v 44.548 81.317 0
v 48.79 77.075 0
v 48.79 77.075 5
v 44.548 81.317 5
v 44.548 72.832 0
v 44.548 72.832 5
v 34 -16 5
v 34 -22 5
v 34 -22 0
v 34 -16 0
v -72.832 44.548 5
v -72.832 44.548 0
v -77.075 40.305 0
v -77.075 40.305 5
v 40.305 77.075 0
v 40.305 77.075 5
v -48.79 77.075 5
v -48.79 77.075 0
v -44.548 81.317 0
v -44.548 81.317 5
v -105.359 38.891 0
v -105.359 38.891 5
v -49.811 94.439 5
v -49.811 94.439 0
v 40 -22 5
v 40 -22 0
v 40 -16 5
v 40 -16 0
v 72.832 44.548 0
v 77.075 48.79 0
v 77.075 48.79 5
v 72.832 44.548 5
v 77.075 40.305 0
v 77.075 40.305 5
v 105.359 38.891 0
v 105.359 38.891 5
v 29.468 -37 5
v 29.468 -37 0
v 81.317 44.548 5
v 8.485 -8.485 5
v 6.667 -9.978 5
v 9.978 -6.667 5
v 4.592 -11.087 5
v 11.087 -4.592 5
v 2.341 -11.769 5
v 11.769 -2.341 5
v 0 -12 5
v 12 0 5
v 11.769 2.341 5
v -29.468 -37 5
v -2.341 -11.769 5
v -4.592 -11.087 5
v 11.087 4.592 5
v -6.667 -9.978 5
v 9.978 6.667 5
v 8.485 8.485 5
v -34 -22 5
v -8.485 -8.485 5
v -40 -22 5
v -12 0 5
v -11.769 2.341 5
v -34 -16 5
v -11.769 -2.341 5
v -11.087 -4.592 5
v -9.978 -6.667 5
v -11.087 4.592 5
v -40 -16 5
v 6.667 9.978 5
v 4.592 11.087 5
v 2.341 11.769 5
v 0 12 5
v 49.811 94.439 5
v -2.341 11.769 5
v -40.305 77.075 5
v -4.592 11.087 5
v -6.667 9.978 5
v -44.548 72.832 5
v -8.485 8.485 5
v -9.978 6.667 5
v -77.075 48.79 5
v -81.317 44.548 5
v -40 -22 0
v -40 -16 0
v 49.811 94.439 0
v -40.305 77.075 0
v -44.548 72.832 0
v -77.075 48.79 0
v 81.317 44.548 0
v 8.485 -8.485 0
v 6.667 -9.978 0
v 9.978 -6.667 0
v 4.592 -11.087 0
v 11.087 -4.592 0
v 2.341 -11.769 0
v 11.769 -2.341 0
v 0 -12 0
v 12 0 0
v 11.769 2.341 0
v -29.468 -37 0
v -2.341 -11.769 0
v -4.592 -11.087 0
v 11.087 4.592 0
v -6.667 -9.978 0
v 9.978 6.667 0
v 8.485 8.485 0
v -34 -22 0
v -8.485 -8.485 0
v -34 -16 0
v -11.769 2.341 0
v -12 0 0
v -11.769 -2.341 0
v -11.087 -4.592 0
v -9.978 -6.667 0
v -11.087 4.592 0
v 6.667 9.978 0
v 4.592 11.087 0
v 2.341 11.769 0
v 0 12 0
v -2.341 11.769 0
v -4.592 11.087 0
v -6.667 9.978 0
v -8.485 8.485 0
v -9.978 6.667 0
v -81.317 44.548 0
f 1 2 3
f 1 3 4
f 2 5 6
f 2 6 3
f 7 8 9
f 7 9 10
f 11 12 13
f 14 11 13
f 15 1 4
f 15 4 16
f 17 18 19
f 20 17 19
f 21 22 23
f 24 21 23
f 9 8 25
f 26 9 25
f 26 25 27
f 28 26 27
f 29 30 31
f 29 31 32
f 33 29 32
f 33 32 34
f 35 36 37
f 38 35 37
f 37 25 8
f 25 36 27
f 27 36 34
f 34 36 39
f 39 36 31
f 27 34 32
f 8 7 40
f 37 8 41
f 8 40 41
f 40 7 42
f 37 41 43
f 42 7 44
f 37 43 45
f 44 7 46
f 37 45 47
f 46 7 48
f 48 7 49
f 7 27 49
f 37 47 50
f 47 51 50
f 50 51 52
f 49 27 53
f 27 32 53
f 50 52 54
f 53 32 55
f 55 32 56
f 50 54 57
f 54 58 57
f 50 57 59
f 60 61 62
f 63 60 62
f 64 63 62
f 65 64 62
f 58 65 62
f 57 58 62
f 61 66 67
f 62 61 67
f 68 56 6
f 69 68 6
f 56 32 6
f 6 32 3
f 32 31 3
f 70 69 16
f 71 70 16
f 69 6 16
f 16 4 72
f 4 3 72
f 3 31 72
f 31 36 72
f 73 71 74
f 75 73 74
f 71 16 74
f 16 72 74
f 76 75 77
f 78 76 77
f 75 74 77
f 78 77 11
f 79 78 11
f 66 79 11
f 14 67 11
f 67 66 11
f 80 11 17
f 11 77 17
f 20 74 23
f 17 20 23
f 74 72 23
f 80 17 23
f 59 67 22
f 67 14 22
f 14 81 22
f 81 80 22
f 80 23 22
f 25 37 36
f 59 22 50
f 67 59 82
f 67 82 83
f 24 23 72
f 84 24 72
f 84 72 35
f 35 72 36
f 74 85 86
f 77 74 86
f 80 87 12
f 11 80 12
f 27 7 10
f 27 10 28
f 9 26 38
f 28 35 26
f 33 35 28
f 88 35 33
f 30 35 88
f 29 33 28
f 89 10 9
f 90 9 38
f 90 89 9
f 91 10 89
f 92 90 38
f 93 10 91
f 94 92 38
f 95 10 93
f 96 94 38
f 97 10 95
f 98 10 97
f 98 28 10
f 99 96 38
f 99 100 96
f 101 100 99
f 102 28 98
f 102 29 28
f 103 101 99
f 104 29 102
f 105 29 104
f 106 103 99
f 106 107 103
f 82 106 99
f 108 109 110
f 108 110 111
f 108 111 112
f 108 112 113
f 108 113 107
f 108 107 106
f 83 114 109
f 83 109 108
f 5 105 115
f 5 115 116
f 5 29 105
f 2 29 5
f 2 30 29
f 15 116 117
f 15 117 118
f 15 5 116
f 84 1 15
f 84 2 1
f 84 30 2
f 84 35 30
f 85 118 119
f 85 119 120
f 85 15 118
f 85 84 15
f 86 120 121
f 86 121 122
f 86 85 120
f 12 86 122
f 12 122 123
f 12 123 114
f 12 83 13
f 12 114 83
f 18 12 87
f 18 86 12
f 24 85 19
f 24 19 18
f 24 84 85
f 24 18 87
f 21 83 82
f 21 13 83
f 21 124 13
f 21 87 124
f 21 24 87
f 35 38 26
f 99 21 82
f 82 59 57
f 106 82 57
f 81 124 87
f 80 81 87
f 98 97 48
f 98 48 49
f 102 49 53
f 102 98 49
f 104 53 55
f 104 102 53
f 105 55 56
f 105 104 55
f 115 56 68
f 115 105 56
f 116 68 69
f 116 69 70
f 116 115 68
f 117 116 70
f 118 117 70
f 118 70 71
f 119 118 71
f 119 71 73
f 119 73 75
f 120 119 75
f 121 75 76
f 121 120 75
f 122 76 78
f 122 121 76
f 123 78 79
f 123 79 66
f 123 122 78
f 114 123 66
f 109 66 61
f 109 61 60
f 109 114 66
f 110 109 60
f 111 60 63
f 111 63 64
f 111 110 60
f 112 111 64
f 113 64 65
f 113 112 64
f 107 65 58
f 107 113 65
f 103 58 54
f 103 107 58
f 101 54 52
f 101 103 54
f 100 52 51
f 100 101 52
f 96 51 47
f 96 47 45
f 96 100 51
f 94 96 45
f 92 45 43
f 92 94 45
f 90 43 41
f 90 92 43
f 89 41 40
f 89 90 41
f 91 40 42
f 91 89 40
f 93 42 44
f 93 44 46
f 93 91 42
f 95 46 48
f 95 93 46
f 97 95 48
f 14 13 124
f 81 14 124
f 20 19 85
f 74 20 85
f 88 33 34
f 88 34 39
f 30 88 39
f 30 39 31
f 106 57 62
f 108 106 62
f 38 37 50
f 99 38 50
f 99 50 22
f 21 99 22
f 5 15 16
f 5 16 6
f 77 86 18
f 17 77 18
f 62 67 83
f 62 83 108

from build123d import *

# Parameters (mm, degrees)
SKETCH3_R           = 12
BOSS_EXTRUDE1_DEPTH = 5
BOSS_EXTRUDE2_DEPTH = 5
SKETCH6_W           = 6
SKETCH6_H           = 6
CUT_EXTRUDE1_DEPTH  = 5


with BuildPart() as part:
    # Sketch3 → Boss-Extrude1 (new body)
    with BuildSketch(Plane.XY):
        Polygon((-77.781745931, 49.497474683), (-49.497474683, 77.781745931), (-43.840620434, 83.43860018), (43.840620434, 83.43860018), (49.497474683, 77.781745931), (77.781745931, 49.497474683), (88.388347648, 38.890872965), (27.497474683, -22), (-27.497474683, -22), (-88.388347648, 38.890872965), align=None)
        Circle(SKETCH3_R, mode=Mode.SUBTRACT)
        Polygon((-81.317279836, 44.547727215), (-77.074639149, 48.790367902), (-72.831998462, 44.547727215), (-77.074639149, 40.305086528), align=None, mode=Mode.SUBTRACT)
        Polygon((-48.790367902, 77.074639149), (-44.547727215, 81.317279836), (-40.305086528, 77.074639149), (-44.547727215, 72.831998462), align=None, mode=Mode.SUBTRACT)
        Polygon((40.305086528, 77.074639149), (44.547727215, 72.831998462), (48.790367902, 77.074639149), (44.547727215, 81.317279836), align=None, mode=Mode.SUBTRACT)
        Polygon((72.831998462, 44.547727215), (77.074639149, 40.305086528), (81.317279836, 44.547727215), (77.074639149, 48.790367902), align=None, mode=Mode.SUBTRACT)
    extrude(amount=BOSS_EXTRUDE1_DEPTH)

    # Sketch5 → Boss-Extrude2 (add)
    with BuildSketch(Plane.XY.offset(5)):
        Polygon((-105.358910397, 38.890872965), (-49.811183182, 94.43860018), (49.811183182, 94.43860018), (105.358910397, 38.890872965), (29.468037432, -37), (-29.468037432, -37), align=None)
        Polygon((-43.840620434, 83.43860018), (-88.388347648, 38.890872965), (-27.497474683, -22), (27.497474683, -22), (88.388347648, 38.890872965), (43.840620434, 83.43860018), align=None, mode=Mode.SUBTRACT)
    extrude(amount=-BOSS_EXTRUDE2_DEPTH)

    # Sketch6 → Cut-Extrude1 (cut)
    with BuildSketch(Plane.XY.offset(5)):
        with Locations((-37, -19)):
            Rectangle(SKETCH6_W, SKETCH6_H)
        with Locations((37, -19)):
            Rectangle(SKETCH6_W, SKETCH6_H)
    extrude(amount=-CUT_EXTRUDE1_DEPTH, mode=Mode.SUBTRACT)


solid = part.part
